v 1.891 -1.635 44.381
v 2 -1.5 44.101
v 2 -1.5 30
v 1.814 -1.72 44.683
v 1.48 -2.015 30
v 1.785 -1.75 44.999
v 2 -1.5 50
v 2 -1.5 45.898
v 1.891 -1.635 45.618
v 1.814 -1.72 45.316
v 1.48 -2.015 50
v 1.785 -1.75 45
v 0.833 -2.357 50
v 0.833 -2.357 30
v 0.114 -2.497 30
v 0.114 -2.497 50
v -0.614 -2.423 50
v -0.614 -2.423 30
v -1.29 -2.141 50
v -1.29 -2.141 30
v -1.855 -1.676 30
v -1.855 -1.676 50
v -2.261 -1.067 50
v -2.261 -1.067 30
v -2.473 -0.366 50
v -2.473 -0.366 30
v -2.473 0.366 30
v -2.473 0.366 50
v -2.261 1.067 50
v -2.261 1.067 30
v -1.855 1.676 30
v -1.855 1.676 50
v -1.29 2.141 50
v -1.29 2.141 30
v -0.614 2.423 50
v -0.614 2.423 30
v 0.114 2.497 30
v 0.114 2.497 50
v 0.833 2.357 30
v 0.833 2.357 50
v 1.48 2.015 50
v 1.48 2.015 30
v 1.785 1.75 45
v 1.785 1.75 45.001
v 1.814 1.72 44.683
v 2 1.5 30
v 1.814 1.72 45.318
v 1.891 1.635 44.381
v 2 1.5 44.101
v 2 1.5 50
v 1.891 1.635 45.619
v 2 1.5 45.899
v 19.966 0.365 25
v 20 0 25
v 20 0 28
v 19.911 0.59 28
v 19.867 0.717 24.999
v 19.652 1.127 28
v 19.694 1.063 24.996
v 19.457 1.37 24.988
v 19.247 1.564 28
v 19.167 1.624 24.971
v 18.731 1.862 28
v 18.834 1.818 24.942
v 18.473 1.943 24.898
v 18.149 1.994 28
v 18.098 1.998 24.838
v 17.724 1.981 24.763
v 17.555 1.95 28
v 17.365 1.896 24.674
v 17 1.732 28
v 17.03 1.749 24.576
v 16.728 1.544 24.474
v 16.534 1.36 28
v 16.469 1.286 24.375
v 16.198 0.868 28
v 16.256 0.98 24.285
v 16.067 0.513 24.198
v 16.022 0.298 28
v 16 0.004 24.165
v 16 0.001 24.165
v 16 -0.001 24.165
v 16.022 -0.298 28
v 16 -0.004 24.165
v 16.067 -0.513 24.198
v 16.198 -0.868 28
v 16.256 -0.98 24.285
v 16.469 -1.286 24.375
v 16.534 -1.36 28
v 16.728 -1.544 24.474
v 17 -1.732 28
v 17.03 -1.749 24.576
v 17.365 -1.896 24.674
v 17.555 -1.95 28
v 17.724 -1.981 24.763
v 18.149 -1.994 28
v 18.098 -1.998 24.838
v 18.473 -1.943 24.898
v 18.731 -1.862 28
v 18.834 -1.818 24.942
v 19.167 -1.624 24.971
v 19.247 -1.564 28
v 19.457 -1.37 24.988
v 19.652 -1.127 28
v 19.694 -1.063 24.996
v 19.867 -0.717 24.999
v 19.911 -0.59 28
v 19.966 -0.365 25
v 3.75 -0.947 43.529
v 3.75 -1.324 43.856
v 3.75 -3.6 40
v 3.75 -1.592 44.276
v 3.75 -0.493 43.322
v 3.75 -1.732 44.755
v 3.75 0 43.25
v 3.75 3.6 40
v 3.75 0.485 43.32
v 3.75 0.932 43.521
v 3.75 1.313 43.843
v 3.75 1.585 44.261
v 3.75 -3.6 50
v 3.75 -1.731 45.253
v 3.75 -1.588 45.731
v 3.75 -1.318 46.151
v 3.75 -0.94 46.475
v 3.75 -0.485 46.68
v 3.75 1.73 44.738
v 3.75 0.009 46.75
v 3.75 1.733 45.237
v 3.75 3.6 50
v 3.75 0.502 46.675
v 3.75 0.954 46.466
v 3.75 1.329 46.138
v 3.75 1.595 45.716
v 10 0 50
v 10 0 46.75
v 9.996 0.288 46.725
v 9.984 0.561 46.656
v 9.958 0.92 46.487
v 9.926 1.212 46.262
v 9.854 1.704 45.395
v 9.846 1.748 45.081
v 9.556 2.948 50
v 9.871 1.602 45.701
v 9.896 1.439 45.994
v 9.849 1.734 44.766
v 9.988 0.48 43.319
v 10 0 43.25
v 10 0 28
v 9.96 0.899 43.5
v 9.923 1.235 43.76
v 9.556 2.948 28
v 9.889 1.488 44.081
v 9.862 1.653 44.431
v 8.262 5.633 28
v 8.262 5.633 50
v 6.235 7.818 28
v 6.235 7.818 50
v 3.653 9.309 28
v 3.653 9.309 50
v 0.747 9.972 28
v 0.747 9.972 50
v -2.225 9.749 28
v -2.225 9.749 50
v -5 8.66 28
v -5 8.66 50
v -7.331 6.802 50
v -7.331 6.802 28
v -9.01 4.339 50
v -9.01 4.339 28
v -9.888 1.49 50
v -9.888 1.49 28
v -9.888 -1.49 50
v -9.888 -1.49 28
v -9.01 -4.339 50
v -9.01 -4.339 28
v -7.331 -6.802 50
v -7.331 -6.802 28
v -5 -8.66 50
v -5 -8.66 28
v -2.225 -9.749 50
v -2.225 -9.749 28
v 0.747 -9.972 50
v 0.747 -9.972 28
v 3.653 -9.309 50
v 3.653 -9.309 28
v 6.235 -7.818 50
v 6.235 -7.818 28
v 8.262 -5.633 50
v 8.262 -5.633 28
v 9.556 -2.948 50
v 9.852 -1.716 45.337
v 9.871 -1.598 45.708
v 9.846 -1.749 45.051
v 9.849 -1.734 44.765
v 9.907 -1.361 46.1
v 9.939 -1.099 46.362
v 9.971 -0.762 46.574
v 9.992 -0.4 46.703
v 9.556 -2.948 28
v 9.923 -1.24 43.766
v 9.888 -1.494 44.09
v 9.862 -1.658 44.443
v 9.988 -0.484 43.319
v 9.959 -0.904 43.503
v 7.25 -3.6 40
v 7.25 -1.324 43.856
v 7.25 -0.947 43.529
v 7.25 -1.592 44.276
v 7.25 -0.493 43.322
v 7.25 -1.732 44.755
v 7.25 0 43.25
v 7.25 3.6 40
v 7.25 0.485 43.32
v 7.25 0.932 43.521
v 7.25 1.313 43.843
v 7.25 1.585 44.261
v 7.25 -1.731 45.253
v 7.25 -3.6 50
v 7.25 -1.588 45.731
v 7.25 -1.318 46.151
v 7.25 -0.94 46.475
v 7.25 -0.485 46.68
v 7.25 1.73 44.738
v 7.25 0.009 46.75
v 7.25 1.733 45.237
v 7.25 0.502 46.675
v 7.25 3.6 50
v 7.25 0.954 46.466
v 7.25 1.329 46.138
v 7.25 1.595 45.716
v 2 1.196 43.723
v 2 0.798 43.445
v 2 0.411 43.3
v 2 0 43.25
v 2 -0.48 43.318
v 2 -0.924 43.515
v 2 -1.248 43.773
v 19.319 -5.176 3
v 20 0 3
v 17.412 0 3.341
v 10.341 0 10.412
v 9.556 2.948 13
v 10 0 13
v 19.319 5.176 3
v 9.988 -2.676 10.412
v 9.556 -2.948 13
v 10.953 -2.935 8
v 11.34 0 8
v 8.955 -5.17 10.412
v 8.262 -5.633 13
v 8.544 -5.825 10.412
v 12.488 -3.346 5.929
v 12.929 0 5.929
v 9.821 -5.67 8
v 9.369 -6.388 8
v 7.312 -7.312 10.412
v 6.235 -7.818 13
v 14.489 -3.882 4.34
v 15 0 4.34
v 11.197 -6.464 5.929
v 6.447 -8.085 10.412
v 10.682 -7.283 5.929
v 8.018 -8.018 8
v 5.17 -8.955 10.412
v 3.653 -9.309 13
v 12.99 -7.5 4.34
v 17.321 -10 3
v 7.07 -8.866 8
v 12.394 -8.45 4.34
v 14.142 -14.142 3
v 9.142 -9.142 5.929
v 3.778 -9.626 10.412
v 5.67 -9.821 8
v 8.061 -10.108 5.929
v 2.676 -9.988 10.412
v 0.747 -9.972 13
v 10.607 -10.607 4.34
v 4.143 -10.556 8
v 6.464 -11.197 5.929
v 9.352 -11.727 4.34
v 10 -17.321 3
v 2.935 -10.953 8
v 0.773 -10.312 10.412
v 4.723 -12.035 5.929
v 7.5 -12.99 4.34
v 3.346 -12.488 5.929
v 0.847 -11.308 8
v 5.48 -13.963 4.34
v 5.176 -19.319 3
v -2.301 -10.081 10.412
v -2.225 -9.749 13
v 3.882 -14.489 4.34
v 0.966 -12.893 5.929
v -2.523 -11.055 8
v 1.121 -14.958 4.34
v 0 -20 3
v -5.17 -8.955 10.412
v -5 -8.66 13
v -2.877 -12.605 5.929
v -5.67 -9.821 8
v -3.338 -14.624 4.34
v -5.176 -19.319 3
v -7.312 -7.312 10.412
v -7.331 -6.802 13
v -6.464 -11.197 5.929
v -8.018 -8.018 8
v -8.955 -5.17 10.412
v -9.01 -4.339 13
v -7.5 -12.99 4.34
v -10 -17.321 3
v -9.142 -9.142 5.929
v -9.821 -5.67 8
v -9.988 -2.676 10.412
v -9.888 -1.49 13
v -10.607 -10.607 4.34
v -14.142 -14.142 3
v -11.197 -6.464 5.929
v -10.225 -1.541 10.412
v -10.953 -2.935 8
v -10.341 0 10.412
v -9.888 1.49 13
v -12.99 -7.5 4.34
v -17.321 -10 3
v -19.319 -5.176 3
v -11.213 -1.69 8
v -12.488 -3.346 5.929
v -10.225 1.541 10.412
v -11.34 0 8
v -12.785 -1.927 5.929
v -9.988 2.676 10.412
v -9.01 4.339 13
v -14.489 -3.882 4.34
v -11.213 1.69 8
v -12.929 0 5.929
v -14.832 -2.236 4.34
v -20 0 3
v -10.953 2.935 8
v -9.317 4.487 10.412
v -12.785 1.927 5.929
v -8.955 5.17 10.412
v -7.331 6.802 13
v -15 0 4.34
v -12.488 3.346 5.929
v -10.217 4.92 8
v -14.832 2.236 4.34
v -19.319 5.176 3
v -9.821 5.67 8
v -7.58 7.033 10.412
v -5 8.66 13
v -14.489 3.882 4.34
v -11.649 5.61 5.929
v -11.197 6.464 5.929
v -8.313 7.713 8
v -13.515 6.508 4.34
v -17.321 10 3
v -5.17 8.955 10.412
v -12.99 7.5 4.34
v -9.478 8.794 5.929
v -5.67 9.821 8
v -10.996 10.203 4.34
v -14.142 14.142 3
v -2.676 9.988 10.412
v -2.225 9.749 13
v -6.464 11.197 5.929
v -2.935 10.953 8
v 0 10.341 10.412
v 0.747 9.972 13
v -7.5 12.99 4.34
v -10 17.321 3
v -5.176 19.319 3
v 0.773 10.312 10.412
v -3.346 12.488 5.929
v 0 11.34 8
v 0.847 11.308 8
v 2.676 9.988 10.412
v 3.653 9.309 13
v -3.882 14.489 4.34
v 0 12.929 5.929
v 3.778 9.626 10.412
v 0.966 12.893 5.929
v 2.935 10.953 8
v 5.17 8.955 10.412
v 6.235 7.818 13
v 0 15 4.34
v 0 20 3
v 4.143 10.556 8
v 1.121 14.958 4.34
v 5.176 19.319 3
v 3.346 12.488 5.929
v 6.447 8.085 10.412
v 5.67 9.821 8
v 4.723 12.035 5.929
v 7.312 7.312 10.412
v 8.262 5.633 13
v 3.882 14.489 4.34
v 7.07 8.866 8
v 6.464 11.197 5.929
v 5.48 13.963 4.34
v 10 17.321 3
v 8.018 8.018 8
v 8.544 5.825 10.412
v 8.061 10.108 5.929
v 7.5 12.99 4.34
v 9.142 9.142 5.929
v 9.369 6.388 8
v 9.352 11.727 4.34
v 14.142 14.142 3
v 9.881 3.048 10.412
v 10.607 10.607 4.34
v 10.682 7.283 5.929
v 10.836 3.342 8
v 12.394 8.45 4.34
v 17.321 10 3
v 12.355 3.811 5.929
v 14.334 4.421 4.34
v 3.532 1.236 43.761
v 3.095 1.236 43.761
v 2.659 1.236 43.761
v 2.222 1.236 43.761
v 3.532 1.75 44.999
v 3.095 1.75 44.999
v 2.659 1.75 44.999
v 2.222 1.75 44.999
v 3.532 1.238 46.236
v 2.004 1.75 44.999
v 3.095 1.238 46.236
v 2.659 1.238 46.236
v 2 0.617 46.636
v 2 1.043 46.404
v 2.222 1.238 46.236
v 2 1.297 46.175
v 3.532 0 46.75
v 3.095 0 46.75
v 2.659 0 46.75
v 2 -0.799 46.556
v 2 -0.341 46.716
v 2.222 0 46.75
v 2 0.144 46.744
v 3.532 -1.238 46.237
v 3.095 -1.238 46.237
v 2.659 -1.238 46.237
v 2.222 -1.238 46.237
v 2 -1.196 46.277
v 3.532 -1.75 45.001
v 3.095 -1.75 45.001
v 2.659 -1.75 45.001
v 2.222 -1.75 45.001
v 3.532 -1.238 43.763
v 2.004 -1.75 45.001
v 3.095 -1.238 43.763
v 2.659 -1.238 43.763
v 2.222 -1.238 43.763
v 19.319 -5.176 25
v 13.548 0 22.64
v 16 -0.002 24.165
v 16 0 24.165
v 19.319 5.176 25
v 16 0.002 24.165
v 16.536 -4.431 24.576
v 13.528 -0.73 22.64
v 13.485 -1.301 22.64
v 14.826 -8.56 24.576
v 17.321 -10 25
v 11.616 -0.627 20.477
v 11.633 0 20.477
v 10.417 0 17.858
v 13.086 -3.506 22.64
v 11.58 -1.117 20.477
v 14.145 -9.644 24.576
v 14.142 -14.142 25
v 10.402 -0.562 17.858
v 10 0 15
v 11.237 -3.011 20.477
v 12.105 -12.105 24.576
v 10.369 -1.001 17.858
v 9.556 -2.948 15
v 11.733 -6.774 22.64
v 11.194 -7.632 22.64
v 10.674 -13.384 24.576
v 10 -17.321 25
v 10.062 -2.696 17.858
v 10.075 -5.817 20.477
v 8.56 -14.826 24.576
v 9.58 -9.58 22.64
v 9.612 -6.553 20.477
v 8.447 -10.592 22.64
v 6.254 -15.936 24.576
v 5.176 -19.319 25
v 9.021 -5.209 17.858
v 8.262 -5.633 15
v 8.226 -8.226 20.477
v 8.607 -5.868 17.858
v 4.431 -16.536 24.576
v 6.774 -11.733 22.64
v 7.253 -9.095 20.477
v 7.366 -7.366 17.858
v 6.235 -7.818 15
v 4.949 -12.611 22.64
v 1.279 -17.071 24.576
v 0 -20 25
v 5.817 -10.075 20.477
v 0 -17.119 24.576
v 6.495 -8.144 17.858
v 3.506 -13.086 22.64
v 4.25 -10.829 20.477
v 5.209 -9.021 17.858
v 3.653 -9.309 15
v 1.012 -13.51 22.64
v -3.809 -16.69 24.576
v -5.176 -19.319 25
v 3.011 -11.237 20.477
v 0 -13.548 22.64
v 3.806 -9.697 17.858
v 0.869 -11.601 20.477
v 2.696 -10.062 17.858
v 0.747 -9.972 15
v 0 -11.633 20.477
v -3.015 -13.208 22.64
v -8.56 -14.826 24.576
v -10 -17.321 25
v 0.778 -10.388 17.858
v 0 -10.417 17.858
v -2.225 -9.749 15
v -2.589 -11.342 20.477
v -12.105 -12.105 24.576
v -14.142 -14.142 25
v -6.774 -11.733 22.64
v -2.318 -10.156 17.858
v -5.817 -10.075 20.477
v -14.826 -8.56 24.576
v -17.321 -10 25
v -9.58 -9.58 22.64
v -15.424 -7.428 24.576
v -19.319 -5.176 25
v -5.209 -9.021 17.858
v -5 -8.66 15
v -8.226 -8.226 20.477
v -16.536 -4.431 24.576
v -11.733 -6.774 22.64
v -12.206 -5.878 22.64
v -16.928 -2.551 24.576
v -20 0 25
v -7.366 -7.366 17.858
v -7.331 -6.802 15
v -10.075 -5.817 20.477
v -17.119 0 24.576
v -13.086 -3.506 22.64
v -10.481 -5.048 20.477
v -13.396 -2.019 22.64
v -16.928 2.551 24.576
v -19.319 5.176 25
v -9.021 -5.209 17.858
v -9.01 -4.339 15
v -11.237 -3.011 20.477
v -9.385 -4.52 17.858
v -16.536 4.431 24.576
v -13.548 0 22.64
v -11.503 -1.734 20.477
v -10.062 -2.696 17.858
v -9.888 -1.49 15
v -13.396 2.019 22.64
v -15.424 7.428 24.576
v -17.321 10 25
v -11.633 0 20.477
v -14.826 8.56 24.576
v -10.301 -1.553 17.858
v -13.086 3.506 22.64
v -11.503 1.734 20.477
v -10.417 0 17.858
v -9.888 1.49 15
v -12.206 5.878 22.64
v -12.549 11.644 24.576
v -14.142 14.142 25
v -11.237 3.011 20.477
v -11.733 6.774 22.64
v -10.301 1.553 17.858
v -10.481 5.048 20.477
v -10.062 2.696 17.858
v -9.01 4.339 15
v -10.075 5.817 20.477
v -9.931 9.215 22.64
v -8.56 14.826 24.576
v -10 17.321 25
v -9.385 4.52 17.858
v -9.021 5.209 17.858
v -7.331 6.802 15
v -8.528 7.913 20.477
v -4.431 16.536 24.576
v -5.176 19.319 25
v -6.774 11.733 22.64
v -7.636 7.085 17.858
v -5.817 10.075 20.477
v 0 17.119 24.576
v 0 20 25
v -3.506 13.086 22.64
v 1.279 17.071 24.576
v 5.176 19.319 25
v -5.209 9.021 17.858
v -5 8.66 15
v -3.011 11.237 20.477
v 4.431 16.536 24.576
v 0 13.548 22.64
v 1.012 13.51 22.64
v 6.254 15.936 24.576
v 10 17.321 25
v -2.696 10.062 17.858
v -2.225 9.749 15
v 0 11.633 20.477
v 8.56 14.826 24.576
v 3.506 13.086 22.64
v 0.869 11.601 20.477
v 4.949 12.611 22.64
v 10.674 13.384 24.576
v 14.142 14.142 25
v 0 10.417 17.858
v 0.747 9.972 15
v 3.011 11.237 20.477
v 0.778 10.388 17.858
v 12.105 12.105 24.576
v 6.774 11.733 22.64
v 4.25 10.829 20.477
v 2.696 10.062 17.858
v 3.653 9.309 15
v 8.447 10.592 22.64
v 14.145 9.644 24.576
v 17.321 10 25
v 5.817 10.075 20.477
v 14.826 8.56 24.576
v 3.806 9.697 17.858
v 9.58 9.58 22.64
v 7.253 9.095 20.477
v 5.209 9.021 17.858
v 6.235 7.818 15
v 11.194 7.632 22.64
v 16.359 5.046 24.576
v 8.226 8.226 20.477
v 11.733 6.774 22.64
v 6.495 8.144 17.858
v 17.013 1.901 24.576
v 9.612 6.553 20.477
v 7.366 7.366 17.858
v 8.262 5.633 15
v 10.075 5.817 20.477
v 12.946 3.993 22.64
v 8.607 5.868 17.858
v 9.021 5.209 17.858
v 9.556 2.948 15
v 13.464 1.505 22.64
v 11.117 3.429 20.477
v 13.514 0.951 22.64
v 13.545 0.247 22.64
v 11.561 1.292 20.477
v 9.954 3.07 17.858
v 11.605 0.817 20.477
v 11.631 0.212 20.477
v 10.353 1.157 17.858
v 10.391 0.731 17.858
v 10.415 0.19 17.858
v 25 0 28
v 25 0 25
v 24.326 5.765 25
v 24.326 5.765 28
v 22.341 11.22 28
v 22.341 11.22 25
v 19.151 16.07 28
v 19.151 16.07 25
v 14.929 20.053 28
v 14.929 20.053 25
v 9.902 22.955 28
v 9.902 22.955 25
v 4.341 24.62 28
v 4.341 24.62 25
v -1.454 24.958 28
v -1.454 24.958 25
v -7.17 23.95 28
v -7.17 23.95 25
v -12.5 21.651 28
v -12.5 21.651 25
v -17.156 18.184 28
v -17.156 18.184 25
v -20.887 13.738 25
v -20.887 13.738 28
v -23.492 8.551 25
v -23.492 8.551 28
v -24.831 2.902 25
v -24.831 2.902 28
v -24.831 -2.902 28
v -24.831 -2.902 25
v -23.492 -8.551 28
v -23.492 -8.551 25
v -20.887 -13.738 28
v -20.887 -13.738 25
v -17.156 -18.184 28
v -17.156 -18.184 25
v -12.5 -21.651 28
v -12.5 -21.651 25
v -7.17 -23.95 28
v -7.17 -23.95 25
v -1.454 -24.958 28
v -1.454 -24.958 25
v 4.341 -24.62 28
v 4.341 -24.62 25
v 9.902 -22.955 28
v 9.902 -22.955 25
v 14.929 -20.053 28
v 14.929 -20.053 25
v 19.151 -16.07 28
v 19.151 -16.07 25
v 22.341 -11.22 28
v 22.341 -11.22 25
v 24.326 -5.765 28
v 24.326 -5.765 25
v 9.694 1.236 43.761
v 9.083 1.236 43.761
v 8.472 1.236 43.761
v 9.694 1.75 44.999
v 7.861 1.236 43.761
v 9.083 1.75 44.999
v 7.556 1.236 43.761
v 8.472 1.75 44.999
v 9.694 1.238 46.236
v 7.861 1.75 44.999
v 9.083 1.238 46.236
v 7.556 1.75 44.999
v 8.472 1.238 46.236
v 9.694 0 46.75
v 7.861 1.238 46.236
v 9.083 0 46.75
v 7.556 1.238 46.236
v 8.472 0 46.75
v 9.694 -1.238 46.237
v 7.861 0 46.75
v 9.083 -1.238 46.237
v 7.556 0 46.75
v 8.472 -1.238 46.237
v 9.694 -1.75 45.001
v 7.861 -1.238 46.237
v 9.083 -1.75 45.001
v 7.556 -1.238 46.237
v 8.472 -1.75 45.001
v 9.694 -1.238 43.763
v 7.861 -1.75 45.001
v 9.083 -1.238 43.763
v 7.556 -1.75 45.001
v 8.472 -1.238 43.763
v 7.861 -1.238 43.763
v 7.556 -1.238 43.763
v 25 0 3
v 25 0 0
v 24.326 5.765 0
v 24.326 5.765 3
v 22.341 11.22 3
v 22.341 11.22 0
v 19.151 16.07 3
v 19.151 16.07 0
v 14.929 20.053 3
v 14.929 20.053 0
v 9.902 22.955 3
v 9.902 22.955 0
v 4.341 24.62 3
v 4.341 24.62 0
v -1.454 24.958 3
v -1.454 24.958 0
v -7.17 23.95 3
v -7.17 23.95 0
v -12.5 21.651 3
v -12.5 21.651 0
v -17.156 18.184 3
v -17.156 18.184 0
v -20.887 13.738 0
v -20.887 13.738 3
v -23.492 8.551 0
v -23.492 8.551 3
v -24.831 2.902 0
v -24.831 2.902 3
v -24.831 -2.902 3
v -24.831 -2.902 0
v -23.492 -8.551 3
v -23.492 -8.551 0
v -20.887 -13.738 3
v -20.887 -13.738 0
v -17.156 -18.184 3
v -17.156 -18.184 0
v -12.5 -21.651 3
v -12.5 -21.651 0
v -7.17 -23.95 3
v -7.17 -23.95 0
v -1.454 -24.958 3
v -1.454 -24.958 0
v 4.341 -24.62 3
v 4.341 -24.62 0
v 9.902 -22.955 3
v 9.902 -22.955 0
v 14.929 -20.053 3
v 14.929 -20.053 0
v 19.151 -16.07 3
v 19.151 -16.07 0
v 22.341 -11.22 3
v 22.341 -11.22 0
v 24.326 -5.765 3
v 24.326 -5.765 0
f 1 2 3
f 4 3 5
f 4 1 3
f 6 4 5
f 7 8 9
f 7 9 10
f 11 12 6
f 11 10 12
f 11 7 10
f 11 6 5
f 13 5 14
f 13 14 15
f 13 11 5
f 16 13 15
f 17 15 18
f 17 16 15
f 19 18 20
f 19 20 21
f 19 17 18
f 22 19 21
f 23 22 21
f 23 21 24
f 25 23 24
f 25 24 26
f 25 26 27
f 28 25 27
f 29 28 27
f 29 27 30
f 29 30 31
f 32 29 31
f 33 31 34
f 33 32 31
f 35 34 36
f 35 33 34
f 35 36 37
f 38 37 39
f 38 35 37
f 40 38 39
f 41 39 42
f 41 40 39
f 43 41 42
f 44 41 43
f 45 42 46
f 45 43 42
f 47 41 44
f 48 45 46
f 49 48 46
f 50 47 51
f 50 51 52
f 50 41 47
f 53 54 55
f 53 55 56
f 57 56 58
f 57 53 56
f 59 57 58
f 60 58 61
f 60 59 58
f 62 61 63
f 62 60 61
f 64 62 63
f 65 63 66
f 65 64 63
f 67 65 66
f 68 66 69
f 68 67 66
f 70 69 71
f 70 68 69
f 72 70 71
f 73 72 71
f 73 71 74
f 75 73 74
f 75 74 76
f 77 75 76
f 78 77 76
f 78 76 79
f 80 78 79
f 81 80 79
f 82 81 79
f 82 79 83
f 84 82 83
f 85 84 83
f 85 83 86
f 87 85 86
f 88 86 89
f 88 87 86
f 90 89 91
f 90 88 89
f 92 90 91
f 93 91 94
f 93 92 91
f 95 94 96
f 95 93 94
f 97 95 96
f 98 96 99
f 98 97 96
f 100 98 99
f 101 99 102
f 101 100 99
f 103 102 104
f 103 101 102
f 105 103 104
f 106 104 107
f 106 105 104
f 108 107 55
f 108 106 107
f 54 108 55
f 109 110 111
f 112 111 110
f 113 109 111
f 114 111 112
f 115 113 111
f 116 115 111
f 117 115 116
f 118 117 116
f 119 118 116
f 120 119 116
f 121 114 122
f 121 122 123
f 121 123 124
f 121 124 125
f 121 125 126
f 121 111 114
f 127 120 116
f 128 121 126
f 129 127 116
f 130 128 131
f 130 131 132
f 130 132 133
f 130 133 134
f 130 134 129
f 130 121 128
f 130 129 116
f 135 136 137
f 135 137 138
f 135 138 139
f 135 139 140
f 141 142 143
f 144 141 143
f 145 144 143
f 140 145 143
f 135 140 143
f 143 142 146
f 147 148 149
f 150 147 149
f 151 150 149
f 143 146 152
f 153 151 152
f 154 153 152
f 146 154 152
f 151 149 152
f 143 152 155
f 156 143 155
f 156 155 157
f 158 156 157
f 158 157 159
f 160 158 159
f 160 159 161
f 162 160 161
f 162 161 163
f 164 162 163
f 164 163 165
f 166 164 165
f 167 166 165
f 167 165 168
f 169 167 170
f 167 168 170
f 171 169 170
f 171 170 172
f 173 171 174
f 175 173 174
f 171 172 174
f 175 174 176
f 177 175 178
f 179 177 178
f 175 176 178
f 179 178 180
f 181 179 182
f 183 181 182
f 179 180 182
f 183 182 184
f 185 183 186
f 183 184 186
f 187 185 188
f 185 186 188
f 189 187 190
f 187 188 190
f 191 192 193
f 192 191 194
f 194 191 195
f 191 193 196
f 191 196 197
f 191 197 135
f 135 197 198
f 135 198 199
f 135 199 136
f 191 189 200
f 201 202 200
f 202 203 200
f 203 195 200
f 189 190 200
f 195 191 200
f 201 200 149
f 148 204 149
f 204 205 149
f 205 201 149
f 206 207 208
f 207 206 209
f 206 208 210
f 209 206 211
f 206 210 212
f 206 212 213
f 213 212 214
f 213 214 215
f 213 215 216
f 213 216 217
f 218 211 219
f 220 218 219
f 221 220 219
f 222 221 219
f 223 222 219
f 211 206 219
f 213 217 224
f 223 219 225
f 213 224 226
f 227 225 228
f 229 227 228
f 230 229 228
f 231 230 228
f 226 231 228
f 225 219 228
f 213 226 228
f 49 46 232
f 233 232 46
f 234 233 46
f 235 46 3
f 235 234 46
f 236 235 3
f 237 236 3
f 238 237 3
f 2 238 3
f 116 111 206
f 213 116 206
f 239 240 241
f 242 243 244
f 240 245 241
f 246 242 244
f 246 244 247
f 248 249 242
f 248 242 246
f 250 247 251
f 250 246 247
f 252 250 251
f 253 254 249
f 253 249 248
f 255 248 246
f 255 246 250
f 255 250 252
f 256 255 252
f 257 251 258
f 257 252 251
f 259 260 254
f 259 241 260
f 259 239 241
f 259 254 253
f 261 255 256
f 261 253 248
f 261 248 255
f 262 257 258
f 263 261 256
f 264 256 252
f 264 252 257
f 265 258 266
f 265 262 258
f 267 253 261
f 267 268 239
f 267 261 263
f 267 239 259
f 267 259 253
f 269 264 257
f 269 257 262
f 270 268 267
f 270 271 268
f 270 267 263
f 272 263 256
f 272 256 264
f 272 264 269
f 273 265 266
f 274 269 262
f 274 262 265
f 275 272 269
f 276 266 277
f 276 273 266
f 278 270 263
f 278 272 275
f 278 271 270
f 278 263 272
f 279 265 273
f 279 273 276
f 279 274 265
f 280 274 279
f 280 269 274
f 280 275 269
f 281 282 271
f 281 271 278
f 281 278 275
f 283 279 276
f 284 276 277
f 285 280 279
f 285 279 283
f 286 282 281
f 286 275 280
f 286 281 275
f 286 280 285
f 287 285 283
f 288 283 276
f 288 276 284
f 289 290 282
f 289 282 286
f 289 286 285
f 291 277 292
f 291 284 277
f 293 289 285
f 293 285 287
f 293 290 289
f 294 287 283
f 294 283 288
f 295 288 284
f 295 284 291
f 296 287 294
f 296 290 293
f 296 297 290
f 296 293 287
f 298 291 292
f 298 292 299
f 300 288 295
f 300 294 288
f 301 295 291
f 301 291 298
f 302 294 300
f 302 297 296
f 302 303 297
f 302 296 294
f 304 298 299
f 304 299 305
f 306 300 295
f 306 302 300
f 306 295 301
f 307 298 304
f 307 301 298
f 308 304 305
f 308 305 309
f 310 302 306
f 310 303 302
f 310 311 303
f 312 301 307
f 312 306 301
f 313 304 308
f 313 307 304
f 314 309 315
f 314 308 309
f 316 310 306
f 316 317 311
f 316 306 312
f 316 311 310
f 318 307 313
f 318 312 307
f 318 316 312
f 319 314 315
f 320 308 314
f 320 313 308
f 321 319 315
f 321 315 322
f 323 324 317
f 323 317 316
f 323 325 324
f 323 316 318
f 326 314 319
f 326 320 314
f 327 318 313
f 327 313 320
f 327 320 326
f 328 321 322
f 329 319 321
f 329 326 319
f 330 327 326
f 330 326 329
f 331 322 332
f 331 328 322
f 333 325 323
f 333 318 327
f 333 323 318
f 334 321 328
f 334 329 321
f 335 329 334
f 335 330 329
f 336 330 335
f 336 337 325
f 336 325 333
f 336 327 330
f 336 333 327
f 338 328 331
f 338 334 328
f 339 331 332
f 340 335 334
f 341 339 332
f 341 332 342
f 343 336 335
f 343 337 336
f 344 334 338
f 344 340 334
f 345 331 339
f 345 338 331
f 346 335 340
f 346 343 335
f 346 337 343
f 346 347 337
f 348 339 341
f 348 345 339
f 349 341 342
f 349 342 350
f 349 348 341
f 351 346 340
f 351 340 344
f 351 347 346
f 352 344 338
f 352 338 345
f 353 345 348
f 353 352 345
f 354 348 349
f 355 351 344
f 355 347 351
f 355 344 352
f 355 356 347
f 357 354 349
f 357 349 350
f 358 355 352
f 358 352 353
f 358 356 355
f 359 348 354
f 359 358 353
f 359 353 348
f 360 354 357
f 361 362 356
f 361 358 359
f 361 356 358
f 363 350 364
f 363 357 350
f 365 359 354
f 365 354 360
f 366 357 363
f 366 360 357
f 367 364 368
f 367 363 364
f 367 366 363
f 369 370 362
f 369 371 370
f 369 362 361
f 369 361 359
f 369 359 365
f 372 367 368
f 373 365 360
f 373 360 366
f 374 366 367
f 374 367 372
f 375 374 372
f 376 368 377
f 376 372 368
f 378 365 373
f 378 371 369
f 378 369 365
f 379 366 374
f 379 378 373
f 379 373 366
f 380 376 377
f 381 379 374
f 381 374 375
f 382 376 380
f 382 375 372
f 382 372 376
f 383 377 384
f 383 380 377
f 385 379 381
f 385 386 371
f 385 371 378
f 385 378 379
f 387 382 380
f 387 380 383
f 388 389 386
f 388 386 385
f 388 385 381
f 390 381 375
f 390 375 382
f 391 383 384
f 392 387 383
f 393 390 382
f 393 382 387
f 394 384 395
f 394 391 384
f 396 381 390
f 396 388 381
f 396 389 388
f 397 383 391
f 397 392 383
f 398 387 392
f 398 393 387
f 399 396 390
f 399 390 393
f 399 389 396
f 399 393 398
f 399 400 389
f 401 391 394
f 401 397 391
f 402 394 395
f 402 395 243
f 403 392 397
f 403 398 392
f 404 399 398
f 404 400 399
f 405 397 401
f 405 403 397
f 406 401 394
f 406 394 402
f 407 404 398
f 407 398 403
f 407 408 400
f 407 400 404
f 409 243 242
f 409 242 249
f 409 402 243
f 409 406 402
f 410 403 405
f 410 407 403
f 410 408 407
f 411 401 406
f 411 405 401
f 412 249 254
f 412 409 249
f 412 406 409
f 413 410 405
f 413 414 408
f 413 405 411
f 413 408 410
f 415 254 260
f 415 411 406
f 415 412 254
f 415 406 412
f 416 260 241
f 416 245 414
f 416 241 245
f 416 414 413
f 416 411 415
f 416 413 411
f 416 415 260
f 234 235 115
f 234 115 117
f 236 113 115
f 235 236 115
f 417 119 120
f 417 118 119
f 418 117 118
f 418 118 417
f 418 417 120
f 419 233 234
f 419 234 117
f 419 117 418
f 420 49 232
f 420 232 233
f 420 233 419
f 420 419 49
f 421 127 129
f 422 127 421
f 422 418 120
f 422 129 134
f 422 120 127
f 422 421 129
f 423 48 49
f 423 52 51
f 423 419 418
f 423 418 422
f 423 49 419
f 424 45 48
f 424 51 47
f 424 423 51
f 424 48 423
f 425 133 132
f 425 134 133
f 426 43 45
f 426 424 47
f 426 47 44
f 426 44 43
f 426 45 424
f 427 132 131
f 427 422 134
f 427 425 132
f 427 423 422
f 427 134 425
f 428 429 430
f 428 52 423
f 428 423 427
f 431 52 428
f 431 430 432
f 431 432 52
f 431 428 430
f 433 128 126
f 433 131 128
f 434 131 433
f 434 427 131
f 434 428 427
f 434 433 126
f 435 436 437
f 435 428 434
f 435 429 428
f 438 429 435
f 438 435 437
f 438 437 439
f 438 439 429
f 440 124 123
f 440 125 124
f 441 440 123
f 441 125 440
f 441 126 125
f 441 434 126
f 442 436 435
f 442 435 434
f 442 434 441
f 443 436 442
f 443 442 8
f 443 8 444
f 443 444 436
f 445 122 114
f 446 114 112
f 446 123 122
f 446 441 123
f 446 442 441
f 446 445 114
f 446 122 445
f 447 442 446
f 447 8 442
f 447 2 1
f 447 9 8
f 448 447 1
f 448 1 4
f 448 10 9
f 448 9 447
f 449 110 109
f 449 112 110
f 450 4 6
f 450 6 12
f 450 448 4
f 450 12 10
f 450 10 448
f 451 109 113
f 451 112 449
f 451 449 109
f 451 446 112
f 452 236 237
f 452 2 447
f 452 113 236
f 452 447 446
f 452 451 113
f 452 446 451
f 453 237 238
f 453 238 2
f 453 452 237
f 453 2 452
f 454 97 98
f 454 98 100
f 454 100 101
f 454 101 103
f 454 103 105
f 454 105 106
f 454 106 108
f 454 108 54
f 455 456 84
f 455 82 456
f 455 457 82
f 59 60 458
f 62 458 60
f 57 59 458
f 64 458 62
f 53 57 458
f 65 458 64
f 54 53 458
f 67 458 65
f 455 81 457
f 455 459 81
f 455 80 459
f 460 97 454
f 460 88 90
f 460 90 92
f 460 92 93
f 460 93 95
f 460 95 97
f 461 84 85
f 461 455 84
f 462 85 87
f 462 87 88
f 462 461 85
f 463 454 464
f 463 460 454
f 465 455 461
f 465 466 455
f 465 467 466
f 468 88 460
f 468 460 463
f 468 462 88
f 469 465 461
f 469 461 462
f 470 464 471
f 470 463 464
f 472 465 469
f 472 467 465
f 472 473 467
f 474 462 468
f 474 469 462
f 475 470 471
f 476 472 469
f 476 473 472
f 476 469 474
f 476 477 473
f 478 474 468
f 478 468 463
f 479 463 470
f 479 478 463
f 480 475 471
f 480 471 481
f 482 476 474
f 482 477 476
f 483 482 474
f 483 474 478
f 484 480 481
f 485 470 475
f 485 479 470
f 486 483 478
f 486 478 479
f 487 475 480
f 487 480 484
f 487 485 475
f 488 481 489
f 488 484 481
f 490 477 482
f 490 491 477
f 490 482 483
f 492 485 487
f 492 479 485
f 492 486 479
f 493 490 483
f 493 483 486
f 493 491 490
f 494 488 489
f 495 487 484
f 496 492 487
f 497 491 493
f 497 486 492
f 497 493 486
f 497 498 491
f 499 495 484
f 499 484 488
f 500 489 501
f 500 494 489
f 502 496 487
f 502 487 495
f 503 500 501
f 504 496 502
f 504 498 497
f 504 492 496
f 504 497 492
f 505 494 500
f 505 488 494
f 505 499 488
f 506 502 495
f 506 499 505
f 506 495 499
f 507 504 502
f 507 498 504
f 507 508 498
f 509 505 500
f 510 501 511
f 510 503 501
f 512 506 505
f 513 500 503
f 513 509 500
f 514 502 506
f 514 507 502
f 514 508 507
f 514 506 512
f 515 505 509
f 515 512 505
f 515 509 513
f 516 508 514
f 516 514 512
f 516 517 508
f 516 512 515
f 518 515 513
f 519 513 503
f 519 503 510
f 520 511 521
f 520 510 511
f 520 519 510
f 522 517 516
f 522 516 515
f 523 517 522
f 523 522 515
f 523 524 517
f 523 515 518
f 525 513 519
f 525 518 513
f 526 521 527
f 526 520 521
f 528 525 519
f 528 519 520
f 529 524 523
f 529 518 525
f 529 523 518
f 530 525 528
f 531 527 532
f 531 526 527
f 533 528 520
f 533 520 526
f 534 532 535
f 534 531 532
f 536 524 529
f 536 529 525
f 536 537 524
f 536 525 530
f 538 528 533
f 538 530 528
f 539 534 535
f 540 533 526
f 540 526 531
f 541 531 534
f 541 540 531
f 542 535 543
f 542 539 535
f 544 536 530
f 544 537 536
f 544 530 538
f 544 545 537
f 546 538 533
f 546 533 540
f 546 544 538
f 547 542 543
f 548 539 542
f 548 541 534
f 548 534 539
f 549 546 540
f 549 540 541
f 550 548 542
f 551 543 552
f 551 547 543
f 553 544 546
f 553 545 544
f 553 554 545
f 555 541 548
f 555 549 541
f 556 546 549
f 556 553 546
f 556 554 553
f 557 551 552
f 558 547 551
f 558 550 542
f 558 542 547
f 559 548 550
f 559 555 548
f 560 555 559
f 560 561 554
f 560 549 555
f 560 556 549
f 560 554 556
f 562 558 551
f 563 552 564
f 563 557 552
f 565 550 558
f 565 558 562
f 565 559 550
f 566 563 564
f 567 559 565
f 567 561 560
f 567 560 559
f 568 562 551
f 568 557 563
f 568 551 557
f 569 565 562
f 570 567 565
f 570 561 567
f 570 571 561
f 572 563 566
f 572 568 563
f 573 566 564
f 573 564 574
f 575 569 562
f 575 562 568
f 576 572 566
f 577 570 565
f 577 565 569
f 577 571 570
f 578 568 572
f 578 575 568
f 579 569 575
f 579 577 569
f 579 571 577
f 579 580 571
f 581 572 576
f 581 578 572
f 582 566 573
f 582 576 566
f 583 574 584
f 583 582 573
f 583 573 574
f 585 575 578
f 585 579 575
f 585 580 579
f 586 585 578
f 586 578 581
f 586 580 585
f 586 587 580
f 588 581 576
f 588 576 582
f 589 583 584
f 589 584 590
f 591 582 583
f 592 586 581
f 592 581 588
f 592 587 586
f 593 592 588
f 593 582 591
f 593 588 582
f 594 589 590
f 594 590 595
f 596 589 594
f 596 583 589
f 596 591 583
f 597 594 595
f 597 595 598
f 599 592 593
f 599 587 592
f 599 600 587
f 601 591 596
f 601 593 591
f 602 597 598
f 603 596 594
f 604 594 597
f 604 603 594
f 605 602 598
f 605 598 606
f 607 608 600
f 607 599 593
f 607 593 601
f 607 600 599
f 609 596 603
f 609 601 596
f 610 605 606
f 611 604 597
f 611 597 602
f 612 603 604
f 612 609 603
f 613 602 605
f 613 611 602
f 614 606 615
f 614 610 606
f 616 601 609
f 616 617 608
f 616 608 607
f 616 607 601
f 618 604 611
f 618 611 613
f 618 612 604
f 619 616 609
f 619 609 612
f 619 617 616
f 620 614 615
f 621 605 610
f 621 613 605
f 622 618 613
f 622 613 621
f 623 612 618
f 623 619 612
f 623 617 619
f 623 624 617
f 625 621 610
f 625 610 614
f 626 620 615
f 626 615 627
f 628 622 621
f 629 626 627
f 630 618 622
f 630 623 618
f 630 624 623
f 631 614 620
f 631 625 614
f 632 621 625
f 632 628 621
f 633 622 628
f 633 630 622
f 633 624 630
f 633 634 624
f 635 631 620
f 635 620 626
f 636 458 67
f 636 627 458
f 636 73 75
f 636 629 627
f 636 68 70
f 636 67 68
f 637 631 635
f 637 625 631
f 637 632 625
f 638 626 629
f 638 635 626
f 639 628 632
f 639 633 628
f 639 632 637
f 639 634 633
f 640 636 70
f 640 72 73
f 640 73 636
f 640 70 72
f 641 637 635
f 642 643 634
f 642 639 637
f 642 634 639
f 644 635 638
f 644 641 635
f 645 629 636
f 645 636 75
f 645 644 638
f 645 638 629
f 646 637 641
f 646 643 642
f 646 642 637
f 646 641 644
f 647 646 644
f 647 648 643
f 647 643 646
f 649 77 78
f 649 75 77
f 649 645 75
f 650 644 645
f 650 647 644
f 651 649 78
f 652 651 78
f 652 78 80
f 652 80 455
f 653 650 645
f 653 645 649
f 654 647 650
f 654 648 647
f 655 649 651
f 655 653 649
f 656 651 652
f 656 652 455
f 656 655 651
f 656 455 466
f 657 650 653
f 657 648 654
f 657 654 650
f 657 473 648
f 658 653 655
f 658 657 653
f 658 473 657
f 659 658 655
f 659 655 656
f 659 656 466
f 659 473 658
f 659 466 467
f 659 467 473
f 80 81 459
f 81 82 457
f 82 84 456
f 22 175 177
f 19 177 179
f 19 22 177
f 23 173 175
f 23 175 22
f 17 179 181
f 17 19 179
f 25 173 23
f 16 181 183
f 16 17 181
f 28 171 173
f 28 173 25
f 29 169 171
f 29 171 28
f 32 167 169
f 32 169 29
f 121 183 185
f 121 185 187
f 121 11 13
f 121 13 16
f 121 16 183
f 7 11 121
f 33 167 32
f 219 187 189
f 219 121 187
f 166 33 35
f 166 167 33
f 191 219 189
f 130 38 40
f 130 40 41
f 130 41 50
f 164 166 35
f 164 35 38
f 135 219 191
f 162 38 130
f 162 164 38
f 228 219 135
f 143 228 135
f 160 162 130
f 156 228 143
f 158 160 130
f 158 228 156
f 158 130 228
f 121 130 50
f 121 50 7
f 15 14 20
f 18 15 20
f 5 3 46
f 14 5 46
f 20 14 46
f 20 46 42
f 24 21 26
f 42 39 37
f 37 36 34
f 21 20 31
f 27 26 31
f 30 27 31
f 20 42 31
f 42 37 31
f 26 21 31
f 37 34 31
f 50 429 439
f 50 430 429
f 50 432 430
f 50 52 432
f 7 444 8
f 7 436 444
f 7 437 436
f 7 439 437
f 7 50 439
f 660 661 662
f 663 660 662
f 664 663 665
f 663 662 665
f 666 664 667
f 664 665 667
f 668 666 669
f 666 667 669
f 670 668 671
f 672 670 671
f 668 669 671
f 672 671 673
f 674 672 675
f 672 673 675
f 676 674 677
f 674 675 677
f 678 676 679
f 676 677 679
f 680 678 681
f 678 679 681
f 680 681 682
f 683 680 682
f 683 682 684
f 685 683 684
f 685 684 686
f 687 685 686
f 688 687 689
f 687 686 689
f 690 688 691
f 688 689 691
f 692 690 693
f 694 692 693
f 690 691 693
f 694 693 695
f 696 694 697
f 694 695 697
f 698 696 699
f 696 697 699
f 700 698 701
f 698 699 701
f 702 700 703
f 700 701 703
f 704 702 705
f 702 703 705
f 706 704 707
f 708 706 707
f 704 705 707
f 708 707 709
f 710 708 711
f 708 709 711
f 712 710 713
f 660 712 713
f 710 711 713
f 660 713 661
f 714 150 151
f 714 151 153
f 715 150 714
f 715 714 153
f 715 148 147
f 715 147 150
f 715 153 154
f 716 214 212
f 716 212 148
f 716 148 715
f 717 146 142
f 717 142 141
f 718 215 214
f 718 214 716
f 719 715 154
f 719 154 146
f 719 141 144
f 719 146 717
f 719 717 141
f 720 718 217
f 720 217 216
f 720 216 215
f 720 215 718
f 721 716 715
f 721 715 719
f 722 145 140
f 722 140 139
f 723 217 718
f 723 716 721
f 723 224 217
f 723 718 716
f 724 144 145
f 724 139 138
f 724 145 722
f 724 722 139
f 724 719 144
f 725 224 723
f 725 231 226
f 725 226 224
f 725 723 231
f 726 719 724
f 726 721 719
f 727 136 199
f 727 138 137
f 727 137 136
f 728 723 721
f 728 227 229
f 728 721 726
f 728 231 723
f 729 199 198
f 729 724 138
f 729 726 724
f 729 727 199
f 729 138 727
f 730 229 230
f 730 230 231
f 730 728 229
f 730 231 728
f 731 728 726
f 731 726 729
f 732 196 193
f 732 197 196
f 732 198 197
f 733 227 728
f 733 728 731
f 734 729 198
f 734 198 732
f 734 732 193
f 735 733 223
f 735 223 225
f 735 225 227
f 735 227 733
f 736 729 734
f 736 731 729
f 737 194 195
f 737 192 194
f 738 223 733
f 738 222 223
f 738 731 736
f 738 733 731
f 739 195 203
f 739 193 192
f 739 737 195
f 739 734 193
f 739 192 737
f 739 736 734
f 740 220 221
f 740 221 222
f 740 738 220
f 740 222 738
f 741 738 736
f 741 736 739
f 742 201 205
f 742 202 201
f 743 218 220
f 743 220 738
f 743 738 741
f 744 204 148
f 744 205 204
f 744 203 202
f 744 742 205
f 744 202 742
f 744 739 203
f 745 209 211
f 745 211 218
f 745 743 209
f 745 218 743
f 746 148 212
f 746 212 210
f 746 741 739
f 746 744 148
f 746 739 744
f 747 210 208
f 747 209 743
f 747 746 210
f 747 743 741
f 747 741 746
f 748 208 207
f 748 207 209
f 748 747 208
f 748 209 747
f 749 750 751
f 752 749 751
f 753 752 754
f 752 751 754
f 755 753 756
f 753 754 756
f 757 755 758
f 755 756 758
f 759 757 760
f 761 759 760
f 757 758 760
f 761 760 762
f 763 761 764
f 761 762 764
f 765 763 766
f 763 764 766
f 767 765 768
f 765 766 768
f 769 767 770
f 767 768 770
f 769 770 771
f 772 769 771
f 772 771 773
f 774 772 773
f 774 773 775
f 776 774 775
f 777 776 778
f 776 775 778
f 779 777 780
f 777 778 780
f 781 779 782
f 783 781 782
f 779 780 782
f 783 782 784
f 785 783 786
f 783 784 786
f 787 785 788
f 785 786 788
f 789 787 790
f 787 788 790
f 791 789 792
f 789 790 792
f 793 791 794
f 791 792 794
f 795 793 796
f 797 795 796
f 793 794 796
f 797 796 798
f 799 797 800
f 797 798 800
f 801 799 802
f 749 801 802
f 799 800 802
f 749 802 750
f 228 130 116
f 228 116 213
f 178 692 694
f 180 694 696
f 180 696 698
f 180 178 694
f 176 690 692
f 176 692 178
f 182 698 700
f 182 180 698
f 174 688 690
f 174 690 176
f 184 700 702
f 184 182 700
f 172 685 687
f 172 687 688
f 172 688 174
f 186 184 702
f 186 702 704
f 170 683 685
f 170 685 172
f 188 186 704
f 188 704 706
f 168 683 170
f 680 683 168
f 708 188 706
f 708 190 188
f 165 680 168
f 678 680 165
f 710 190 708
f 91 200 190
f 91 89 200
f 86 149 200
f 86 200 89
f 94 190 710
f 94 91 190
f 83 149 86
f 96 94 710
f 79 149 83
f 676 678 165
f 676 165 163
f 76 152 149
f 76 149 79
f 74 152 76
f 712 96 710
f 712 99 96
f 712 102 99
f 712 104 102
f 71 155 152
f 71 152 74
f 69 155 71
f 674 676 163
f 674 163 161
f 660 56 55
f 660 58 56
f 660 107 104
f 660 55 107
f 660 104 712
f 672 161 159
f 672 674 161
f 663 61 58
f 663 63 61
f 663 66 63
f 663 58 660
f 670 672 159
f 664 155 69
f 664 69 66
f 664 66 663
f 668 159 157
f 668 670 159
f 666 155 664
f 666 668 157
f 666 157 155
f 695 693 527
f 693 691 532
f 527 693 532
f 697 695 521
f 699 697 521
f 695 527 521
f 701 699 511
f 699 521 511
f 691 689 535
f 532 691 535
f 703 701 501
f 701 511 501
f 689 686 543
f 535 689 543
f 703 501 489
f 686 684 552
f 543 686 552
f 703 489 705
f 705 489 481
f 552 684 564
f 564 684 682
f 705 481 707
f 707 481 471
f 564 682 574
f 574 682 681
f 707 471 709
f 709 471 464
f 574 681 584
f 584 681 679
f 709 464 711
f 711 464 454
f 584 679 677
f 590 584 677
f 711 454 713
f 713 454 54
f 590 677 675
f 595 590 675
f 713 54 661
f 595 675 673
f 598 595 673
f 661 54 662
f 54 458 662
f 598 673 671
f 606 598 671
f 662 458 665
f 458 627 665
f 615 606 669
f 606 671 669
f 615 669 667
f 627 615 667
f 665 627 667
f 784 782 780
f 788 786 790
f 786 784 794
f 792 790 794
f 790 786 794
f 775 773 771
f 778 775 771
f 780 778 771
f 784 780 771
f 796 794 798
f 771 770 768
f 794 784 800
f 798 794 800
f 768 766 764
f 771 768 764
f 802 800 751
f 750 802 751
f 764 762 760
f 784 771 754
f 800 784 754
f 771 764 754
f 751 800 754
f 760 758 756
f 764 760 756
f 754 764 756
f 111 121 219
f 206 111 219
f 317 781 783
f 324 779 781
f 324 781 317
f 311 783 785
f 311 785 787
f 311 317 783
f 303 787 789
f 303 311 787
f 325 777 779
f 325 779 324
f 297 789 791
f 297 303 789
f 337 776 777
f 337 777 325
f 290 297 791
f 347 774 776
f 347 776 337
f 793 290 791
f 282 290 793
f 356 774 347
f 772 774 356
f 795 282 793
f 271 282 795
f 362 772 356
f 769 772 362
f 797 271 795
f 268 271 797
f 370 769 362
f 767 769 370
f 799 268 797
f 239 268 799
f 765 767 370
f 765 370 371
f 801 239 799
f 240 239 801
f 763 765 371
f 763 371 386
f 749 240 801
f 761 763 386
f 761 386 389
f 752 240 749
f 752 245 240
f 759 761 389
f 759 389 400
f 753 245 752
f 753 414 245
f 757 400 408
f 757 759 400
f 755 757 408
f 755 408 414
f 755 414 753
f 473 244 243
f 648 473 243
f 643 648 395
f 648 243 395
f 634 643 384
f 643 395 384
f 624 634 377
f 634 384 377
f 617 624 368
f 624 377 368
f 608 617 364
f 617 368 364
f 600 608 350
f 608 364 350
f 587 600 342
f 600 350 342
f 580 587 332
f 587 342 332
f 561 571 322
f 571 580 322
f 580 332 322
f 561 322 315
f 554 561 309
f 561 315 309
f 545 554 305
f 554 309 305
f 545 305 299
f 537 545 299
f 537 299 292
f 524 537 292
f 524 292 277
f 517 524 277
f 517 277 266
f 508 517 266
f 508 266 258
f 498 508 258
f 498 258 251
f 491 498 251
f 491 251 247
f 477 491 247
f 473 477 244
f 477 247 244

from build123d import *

# Parameters (mm, degrees)
CROQUIS1_R              = 10
SALIENTE_EXTRUIR2_DEPTH = 50
CROQUIS4_R              = 25
SALIENTE_EXTRUIR3_DEPTH = 3
SALIENTE_EXTRUIR4_START = 25
CROQUIS5_R              = 25
SALIENTE_EXTRUIR4_DEPTH = 3
REDONDEO2_R             = 10
CORTAR_EXTRUIR1_START   = 50
CORTAR_EXTRUIR1_DEPTH   = 20
CORTAR_EXTRUIR2_START   = 50
CROQUIS7_W              = 3.5
CROQUIS7_H              = 7.2
CORTAR_EXTRUIR2_DEPTH   = 10
CORTAR_EXTRUIR3_START   = 1.785357468
CORTAR_EXTRUIR3_DEPTH   = 8.214642632
CORTAR_EXTRUIR4_START   = 24.165153
CROQUIS9_R              = 2
CORTAR_EXTRUIR4_DEPTH   = 3.834847


# Read off the part's stored shape, not the designer's step: Cortar-Extruir3
with BuildPart() as part:
    # Croquis1 → Saliente-Extruir2 (new body)
    with BuildSketch(Plane.XY):
        Circle(CROQUIS1_R)
    extrude(amount=SALIENTE_EXTRUIR2_DEPTH)

    # Croquis4 → Saliente-Extruir3 (add)
    with BuildSketch(Plane.XY):
        Circle(CROQUIS4_R)
    extrude(amount=SALIENTE_EXTRUIR3_DEPTH)

    # Croquis5 → Saliente-Extruir4 (add)
    with BuildSketch(Plane.XY.offset(SALIENTE_EXTRUIR4_START)):
        Circle(CROQUIS5_R)
    extrude(amount=SALIENTE_EXTRUIR4_DEPTH)

    # Redondeo2
    redondeo2_edges = [part.edges().sort_by_distance(p)[0] for p in [
        (-10, 0, 25),
        (-10, 0, 3),
    ]]
    fillet(redondeo2_edges, radius=REDONDEO2_R)

    # Croquis6 → Cortar-Extruir1 (cut)
    with BuildSketch(Plane.XY.offset(CORTAR_EXTRUIR1_START)):
        with BuildLine():
            Line((2, 1.5), (2, -1.5))
            ThreePointArc((2, -1.5), (-2.5, 0), (2, 1.5))
        make_face()
    extrude(amount=-CORTAR_EXTRUIR1_DEPTH, mode=Mode.SUBTRACT)

    # Croquis7 → Cortar-Extruir2 (cut)
    with BuildSketch(Plane.XY.offset(CORTAR_EXTRUIR2_START)):
        with Locations((5.5, 0)):
            Rectangle(CROQUIS7_W, CROQUIS7_H)
    extrude(amount=-CORTAR_EXTRUIR2_DEPTH, mode=Mode.SUBTRACT)

    # Cortar-Extruir3 outline → Cortar-Extruir3 (cut)
    with BuildSketch(Plane(origin=(0, 0, 0), x_dir=(0, 0, -1), z_dir=(1, 0, 0)).offset(CORTAR_EXTRUIR3_START)):
        with BuildLine():
            add(Edge.make_bspline(
                [(-43.250000008, 0), (-43.250010298, 0.457042806), (-43.439269311, 0.91355666), (-44.08377392, 1.559232298), (-44.536167579, 1.749638189), (-45.461098225, 1.750360744), (-45.914256169, 1.560125471), (-46.558728463, 0.916635921), (-46.75, 0.463408547), (-46.75, -0.463408547), (-46.559497121, -0.915462774), (-45.915045576, -1.559741953), (-45.458501244, -1.749734355), (-44.543528816, -1.750265056), (-44.088756623, -1.563446648), (-43.437067231, -0.912124478), (-43.250180582, -0.457964068), (-43.250000045, -0.000460382), (-43.250000003, -0.000230191), (-43.250000008, 0)],
                knots=[0.500062925, 0.500062925, 0.500062925, 0.500062925, 0.625, 0.625, 0.750000001, 0.750000001, 0.875000002, 0.875000002, 1.000000004, 1.000000004, 1.125000006, 1.125000006, 1.250000009, 1.250000009, 1.375000013, 1.375000013, 1.500000015, 1.500000015, 1.50006294, 1.50006294, 1.50006294, 1.50006294], degree=3))
        make_face()
    extrude(amount=CORTAR_EXTRUIR3_DEPTH, mode=Mode.SUBTRACT)

    # Croquis9 → Cortar-Extruir4 (cut)
    with BuildSketch(Plane.XY.offset(CORTAR_EXTRUIR4_START)):
        with Locations((18, 0)):
            Circle(CROQUIS9_R)
    extrude(amount=CORTAR_EXTRUIR4_DEPTH, mode=Mode.SUBTRACT)


solid = part.part
